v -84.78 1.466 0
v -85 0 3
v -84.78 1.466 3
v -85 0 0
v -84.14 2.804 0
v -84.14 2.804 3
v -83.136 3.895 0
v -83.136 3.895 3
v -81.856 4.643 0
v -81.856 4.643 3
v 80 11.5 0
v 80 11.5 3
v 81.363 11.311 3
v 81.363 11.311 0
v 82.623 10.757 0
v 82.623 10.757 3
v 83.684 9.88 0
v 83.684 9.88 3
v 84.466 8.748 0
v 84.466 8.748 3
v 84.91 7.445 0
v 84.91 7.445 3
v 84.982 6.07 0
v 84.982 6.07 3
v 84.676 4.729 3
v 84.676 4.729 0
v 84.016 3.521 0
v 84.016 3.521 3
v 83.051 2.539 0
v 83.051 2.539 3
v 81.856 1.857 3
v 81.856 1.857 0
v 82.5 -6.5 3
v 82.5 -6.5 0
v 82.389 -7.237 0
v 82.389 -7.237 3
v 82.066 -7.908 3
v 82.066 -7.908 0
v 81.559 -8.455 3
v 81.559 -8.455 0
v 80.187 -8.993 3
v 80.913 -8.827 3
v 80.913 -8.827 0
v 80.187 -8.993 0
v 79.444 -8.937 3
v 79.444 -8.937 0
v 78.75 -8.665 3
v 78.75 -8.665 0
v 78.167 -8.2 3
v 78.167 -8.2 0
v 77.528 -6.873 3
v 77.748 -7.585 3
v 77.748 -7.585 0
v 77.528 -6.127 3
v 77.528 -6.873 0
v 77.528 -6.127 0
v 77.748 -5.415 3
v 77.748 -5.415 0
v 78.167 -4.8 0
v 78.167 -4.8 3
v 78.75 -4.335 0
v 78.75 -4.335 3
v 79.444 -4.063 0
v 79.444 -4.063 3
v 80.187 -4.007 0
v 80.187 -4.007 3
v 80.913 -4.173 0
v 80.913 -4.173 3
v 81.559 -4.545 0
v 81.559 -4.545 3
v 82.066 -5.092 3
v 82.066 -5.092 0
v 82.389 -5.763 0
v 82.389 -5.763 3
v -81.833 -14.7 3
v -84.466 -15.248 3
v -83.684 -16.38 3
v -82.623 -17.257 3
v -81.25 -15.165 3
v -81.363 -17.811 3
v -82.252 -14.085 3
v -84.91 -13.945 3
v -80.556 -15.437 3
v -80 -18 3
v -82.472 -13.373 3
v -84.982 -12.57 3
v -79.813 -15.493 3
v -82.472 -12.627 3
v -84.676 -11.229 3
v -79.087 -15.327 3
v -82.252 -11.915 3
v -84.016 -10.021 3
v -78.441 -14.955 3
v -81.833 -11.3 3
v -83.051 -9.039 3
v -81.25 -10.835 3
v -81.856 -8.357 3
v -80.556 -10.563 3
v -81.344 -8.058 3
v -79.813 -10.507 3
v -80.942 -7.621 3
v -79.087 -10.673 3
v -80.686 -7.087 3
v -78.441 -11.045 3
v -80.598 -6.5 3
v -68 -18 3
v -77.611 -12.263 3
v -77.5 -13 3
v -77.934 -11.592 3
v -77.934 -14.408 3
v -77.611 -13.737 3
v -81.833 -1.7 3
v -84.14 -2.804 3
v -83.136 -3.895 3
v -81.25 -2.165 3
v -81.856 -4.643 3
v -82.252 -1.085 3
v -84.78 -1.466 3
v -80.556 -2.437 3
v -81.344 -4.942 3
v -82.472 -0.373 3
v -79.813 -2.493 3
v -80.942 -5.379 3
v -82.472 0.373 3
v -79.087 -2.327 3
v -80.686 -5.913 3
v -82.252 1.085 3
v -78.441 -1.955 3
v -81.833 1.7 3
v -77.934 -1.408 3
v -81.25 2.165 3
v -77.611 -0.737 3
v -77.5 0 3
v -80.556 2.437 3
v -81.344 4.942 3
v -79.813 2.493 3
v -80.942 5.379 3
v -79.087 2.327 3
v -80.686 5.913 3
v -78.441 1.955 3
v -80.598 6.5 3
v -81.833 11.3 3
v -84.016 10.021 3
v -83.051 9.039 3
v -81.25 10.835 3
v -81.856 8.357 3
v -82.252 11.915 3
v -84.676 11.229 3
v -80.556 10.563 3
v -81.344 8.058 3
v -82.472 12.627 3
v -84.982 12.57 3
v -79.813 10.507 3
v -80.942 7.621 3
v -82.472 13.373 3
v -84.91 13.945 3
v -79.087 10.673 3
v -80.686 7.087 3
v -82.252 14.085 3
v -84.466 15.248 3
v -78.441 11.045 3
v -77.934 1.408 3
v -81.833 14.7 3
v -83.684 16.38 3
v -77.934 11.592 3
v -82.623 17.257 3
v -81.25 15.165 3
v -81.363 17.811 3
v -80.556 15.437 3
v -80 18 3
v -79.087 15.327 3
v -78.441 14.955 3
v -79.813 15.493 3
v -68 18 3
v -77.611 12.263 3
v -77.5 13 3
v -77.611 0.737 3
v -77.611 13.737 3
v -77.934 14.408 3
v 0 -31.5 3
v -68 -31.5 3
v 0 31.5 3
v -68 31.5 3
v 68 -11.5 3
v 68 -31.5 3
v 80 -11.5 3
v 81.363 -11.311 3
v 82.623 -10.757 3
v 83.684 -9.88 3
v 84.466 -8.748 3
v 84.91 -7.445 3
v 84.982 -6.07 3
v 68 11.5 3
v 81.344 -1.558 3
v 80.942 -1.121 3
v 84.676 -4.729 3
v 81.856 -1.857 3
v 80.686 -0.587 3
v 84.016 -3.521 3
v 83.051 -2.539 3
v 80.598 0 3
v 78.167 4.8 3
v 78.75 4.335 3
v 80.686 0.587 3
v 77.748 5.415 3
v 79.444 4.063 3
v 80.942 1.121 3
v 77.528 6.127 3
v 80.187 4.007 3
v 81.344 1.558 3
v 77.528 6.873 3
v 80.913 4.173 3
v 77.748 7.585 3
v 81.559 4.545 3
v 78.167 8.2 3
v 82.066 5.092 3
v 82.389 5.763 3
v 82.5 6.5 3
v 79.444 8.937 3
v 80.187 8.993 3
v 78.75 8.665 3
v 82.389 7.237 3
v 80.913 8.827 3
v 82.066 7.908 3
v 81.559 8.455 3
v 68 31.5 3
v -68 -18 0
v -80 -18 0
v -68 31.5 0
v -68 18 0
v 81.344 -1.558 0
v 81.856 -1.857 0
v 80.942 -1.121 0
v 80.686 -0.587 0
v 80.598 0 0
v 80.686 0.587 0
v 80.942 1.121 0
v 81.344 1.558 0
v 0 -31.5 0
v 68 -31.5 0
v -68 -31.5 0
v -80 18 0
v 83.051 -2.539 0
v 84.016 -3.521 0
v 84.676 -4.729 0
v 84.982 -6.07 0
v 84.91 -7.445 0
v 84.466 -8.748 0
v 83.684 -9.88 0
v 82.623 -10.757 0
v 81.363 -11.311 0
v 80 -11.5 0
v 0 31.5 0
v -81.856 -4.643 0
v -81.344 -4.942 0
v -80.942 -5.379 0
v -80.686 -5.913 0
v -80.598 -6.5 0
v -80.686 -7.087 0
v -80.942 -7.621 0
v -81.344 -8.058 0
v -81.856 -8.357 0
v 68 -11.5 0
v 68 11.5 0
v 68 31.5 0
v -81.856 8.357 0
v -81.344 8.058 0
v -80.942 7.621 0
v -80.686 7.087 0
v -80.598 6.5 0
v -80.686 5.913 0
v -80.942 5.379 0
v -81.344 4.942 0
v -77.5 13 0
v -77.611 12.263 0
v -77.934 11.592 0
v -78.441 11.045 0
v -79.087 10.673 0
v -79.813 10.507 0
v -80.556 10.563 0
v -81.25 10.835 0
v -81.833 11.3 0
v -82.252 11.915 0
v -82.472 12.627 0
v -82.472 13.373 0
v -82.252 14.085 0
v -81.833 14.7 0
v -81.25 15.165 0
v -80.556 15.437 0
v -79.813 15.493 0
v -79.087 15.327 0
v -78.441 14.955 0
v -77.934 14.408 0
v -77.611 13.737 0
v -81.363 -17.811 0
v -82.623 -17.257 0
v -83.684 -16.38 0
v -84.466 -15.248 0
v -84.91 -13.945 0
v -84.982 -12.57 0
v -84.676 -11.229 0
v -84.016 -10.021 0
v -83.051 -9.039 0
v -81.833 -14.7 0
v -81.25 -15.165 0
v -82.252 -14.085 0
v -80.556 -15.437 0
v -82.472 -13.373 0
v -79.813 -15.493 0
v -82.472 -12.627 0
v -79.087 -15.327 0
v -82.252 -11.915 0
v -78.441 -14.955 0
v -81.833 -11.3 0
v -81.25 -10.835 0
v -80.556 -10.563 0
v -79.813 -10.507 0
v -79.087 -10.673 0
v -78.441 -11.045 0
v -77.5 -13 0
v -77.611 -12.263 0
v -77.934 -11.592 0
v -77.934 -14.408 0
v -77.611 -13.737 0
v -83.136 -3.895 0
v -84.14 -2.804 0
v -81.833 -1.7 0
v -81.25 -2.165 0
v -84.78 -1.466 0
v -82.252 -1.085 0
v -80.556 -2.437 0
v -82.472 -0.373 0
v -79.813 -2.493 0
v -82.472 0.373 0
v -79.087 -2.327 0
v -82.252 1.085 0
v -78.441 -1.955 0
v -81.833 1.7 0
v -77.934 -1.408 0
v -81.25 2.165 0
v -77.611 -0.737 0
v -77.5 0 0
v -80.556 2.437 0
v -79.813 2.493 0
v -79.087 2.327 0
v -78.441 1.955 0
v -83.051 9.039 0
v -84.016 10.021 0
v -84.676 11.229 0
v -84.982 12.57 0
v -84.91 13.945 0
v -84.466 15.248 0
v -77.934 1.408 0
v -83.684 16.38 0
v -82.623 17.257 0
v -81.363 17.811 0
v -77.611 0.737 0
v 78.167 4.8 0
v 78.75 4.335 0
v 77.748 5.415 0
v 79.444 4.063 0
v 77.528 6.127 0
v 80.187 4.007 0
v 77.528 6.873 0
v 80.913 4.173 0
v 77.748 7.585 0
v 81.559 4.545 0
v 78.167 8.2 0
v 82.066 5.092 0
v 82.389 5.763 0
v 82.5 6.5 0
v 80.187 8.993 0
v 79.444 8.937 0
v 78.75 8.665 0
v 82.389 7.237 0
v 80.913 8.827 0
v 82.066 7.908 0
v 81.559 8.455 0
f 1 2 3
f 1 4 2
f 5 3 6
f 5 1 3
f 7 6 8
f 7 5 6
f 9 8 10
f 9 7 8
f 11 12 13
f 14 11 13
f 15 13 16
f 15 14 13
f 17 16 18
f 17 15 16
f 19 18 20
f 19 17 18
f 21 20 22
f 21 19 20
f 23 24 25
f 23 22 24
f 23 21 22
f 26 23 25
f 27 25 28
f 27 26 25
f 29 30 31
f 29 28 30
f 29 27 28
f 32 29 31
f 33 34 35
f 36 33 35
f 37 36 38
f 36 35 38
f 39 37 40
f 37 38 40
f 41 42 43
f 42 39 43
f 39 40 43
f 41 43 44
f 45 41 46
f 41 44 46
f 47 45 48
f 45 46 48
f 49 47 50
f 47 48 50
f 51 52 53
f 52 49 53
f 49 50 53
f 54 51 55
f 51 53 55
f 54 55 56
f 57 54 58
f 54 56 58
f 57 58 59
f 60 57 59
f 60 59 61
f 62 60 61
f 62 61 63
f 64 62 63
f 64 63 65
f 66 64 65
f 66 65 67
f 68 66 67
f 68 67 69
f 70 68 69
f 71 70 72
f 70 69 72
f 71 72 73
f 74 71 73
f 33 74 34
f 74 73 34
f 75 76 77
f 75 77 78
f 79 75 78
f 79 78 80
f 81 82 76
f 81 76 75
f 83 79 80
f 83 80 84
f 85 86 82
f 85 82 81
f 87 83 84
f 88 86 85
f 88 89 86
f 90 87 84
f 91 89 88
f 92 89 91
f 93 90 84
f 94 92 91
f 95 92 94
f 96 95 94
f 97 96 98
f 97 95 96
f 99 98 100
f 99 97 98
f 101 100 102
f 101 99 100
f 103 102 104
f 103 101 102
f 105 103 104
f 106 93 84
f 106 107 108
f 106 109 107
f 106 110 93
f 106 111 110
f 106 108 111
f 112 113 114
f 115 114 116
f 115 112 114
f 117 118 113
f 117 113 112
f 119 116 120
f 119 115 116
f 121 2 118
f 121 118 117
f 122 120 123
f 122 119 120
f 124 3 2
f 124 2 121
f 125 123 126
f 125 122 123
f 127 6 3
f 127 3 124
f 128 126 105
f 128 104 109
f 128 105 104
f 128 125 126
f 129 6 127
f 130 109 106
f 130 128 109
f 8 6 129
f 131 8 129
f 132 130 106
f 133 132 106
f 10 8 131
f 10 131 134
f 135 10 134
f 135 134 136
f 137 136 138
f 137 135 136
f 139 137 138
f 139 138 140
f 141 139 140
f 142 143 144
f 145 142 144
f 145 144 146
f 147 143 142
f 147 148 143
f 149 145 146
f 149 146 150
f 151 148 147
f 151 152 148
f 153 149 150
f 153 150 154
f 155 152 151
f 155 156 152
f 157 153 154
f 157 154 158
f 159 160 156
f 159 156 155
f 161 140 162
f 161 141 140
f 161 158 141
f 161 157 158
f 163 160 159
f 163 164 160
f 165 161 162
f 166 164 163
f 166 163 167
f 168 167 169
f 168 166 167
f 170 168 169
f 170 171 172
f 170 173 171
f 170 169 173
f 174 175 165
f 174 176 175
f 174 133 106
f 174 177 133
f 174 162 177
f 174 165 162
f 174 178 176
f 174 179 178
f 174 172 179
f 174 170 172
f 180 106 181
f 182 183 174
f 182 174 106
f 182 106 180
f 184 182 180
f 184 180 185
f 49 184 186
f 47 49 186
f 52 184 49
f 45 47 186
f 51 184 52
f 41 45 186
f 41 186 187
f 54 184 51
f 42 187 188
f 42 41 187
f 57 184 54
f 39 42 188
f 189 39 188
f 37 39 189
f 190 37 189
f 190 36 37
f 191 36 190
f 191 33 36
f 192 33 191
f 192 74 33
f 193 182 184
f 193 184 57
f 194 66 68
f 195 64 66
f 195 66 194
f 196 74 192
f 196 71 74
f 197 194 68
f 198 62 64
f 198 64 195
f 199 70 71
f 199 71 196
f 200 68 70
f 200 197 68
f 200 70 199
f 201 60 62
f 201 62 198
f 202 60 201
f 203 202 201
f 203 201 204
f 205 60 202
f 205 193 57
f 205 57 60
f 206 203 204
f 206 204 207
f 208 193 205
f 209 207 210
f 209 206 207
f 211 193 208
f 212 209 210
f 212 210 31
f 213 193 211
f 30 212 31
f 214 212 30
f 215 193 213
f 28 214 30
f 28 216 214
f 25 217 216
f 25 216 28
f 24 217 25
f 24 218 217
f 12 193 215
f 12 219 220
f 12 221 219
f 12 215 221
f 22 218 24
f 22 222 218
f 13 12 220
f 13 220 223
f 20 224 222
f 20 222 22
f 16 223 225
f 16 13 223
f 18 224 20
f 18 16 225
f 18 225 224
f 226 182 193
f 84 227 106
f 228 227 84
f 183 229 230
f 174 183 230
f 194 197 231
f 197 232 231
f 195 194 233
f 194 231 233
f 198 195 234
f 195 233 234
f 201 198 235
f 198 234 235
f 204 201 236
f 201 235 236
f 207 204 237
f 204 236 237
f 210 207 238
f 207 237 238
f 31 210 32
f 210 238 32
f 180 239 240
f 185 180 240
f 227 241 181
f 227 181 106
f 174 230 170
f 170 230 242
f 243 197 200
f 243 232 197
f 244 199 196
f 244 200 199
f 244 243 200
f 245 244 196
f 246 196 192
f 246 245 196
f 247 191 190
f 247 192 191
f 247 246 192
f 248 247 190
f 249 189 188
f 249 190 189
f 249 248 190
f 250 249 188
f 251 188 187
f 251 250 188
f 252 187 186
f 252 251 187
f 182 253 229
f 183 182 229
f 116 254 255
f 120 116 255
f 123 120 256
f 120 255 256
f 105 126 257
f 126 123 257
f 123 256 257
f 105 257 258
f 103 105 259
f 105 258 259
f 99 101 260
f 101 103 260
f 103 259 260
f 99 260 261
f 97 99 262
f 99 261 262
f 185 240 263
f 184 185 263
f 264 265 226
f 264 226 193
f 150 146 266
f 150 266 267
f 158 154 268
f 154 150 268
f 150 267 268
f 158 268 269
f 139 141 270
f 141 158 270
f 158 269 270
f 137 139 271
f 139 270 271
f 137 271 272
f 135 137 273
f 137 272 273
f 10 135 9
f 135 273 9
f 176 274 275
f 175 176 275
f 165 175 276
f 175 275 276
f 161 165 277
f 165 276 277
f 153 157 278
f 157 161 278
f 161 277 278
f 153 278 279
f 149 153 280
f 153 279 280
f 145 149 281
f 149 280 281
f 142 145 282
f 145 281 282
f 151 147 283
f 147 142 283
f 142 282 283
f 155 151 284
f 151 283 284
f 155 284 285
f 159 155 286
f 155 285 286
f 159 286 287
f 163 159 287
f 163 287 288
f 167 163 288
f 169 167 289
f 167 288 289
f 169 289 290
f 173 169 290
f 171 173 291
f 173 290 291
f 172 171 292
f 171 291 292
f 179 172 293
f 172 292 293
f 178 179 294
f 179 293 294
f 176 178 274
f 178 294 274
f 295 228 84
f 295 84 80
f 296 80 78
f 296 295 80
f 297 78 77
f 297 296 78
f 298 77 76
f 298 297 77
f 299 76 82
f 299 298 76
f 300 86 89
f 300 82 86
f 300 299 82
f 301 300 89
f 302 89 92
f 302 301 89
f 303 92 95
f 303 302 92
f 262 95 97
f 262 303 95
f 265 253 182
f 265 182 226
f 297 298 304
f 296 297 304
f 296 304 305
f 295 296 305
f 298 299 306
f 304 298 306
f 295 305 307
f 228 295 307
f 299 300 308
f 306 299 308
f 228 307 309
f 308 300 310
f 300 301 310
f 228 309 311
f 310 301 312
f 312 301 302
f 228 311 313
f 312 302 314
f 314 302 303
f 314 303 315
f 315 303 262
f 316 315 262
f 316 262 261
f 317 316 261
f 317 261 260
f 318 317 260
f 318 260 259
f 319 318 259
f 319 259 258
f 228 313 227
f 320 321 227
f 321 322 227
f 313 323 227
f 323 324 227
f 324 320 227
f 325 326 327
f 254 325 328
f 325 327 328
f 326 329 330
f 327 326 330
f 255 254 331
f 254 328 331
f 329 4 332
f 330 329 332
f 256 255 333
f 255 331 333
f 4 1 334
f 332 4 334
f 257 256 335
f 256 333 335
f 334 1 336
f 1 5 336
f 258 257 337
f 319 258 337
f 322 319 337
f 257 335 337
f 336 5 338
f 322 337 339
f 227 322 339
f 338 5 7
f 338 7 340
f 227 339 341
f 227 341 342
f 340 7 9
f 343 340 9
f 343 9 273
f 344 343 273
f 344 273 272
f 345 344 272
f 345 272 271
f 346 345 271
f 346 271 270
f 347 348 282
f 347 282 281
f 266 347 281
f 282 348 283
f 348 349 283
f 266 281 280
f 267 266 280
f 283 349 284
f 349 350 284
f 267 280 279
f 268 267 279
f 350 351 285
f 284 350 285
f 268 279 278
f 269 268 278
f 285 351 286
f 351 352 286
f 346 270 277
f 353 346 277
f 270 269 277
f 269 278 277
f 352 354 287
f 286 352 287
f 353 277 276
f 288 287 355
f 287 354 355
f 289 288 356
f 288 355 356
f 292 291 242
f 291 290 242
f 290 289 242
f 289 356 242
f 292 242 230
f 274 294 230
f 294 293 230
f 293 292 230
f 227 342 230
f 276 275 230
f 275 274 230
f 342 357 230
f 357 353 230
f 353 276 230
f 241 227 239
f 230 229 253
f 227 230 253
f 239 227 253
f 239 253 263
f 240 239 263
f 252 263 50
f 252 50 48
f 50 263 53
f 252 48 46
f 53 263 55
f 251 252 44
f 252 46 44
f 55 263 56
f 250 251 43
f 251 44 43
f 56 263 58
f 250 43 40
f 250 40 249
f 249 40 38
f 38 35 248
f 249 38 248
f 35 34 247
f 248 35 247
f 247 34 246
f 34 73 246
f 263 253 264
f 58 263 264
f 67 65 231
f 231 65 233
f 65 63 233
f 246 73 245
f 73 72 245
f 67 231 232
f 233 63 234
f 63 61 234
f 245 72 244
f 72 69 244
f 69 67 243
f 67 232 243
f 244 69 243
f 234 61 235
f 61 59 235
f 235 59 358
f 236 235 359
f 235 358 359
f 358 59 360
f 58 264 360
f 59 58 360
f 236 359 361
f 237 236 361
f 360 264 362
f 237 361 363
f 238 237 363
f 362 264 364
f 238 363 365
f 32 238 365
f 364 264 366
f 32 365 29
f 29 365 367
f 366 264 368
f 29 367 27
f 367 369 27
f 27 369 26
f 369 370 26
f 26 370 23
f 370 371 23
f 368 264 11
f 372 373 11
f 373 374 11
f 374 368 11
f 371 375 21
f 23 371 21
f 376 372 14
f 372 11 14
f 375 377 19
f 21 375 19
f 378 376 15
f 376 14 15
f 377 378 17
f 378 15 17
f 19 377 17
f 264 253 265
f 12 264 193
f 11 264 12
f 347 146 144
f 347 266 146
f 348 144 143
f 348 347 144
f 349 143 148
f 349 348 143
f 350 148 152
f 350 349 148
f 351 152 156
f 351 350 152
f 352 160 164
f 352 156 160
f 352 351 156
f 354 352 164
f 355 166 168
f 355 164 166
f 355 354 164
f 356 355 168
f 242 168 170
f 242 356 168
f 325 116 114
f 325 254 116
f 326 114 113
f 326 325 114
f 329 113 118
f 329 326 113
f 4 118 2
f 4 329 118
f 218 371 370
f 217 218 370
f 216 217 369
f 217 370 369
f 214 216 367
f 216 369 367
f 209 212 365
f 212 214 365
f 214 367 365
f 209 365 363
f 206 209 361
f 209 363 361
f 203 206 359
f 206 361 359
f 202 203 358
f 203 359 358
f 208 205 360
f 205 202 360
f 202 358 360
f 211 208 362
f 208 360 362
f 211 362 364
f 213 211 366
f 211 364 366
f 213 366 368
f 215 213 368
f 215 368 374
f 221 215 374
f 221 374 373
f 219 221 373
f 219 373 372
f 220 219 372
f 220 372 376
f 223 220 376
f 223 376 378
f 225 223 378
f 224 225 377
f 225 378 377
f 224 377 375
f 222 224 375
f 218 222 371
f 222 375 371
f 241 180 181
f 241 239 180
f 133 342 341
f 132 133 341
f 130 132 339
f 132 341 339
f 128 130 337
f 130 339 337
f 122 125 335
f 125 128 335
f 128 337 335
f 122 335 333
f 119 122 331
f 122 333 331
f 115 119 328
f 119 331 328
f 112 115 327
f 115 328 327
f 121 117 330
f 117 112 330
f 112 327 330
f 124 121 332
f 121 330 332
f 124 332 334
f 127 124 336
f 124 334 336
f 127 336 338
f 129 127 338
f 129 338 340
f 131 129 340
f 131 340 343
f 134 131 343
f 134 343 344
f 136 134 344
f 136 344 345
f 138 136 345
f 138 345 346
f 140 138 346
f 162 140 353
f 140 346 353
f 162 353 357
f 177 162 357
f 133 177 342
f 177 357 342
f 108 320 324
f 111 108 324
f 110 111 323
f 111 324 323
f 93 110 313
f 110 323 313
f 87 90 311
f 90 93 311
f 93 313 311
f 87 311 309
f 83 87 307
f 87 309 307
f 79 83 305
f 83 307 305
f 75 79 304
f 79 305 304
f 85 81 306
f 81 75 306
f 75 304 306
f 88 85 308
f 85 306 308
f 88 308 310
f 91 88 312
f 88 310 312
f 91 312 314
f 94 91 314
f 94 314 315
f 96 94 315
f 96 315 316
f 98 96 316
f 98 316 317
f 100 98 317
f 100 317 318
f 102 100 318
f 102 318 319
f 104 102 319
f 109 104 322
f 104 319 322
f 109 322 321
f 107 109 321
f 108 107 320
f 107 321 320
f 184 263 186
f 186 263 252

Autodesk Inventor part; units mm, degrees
ref_plane "YZ Plane" through (0, 0, 0) normal (1, 0, 0) x (0, 1, 0)
ref_plane "XZ Plane" through (0, 0, 0) normal (0, 1, 0) x (-1, 0, 0)
ref_plane "XY Plane" through (0, 0, 0) normal (0, 0, 1) x (1, 0, 0)
sketch "Sketch1" plane through (0, 0, 0) normal (0, 0, 1) x (1, 0, 0)
  line L0 (0, 44.1) -> (0, -44.1) construction
  line L1 (-4897.1485, 0) -> (4897.1485, 0) construction
  line L2 (0, -31.5) -> (-68, -31.5)
  line L3 (-68, -31.5) -> (-68, -18)
  line L4 (-68, -18) -> (-80, -18)
  line L5 (-85, 0) -> (-85, -22.0738) construction
  line L6 (-75, -22.5739) -> (-75, 22.5739) construction
  circle A0 centre (-80, -13) radius 2.5
  circle A1 centre (-80, 0) radius 2.5
  line L7 (-80, 0) -> (-80, -13) construction
  arc A2 (-81.8558, -8.3571) -> (-80, -18) centre (-80, -13) ccw
  arc A3 (-85, 0) -> (-81.8558, -4.6429) centre (-80, 0) ccw
  arc A4 (-81.8558, -8.3571) -> (-81.8558, -4.6429) centre (-82.5981, -6.5) ccw
  line L8 (0, 31.5) -> (-68, 31.5)
  line L9 (-68, 31.5) -> (-68, 18)
  line L10 (-68, 18) -> (-80, 18)
  line L11 (-85, 0) -> (-85, 22.0738) construction
  line L12 (-75, 22.5739) -> (-75, -22.5739) construction
  circle A5 centre (-80, 13) radius 2.5
  circle A6 centre (-80, 0) radius 2.5
  line L13 (-80, 0) -> (-80, 13) construction
  arc A7 (-80, 18) -> (-81.8558, 8.3571) centre (-80, 13) ccw
  arc A8 (-81.8558, 4.6429) -> (-85, 0) centre (-80, 0) ccw
  arc A9 (-81.8558, 4.6429) -> (-81.8558, 8.3571) centre (-82.5981, 6.5) ccw
  line L14 (4897.1485, 0) -> (-4897.1485, 0) construction
  line L15 (0, -31.5) -> (68, -31.5)
  line L16 (68, -31.5) -> (68, -11.5)
  line L17 (68, -11.5) -> (80, -11.5)
  line L18 (68, 11.5) -> (80, 11.5)
  line L19 (68, 31.5) -> (68, 11.5)
  line L20 (0, 31.5) -> (68, 31.5)
  line L21 (80, 11.5) -> (80, -11.5) construction
  circle A10 centre (80, -6.5) radius 2.5
  circle A11 centre (80, 6.5) radius 2.5
  line L22 (75, 22.5739) -> (75, -22.5739) construction
  line L23 (75, 22.5739) -> (75, -22.5739) construction
  arc A12 (80, -11.5) -> (81.8558, -1.8571) centre (80, -6.5) ccw
  arc A13 (81.8558, 1.8571) -> (80, 11.5) centre (80, 6.5) ccw
  arc A14 (81.8558, 1.8571) -> (81.8558, -1.8571) centre (82.5981, 0) ccw
  point P0 (0, 0)
  dimension "d0" = 31.5
  dimension "d2" = 7
  dimension "d4" = 5
  dimension "d5" = 5
  dimension "d6" = 5
  dimension "d7" = 5
  dimension "d8" = 13
  dimension "d9" = 5
  dimension "d10" = 2
  dimension "d11" = 2.5
  dimension "d12" = 5
  dimension "d13" = 2.5
  dimension "d14" = 5
  dimension "d15" = 13
  dimension "d16" = 2
extrude "Extrusion1" add sketch "Sketch1" along normal blind 3
equation "\"d0\" = 0.5 * PowerPCB_Width"
equation "\"d2\" = Interface_Thickness"
equation "\"d7\" = d6"
equation "\"d12\" = d4"
equation "\"d13\" = d11"
equation "\"d14\" = d9"
equation "\"d17\" = PowerPCB_Thickness"
equation "\"Heatsink_Thickness\" = 5"
equation "\"Heatsink_Width\" = 65"
equation "\"Cover_Thickness\" = 2"
equation "\"PowerPCB_Minus_Height\" = 1.2"
equation "\"PowerPCB_Width\" = 63"
equation "\"Interface_Thickness\" = 7"
equation "\"PowerPCB_Thickness\" = 3"
equation "\"PowerPCB_Plus_Height\" = 8"
equation "\"LogicPCB_Width\" = 55"
equation "\"LogicPCB_Thickness\" = 2"
equation "\"LogicPCB_Plus_Height\" = 8"
equation "\"HostPCB_Thickness\" = 1.2"
equation "\"HostPCB_Plus_Height\" = 8"
properties part number "PowerPCB" material "GFRC"
